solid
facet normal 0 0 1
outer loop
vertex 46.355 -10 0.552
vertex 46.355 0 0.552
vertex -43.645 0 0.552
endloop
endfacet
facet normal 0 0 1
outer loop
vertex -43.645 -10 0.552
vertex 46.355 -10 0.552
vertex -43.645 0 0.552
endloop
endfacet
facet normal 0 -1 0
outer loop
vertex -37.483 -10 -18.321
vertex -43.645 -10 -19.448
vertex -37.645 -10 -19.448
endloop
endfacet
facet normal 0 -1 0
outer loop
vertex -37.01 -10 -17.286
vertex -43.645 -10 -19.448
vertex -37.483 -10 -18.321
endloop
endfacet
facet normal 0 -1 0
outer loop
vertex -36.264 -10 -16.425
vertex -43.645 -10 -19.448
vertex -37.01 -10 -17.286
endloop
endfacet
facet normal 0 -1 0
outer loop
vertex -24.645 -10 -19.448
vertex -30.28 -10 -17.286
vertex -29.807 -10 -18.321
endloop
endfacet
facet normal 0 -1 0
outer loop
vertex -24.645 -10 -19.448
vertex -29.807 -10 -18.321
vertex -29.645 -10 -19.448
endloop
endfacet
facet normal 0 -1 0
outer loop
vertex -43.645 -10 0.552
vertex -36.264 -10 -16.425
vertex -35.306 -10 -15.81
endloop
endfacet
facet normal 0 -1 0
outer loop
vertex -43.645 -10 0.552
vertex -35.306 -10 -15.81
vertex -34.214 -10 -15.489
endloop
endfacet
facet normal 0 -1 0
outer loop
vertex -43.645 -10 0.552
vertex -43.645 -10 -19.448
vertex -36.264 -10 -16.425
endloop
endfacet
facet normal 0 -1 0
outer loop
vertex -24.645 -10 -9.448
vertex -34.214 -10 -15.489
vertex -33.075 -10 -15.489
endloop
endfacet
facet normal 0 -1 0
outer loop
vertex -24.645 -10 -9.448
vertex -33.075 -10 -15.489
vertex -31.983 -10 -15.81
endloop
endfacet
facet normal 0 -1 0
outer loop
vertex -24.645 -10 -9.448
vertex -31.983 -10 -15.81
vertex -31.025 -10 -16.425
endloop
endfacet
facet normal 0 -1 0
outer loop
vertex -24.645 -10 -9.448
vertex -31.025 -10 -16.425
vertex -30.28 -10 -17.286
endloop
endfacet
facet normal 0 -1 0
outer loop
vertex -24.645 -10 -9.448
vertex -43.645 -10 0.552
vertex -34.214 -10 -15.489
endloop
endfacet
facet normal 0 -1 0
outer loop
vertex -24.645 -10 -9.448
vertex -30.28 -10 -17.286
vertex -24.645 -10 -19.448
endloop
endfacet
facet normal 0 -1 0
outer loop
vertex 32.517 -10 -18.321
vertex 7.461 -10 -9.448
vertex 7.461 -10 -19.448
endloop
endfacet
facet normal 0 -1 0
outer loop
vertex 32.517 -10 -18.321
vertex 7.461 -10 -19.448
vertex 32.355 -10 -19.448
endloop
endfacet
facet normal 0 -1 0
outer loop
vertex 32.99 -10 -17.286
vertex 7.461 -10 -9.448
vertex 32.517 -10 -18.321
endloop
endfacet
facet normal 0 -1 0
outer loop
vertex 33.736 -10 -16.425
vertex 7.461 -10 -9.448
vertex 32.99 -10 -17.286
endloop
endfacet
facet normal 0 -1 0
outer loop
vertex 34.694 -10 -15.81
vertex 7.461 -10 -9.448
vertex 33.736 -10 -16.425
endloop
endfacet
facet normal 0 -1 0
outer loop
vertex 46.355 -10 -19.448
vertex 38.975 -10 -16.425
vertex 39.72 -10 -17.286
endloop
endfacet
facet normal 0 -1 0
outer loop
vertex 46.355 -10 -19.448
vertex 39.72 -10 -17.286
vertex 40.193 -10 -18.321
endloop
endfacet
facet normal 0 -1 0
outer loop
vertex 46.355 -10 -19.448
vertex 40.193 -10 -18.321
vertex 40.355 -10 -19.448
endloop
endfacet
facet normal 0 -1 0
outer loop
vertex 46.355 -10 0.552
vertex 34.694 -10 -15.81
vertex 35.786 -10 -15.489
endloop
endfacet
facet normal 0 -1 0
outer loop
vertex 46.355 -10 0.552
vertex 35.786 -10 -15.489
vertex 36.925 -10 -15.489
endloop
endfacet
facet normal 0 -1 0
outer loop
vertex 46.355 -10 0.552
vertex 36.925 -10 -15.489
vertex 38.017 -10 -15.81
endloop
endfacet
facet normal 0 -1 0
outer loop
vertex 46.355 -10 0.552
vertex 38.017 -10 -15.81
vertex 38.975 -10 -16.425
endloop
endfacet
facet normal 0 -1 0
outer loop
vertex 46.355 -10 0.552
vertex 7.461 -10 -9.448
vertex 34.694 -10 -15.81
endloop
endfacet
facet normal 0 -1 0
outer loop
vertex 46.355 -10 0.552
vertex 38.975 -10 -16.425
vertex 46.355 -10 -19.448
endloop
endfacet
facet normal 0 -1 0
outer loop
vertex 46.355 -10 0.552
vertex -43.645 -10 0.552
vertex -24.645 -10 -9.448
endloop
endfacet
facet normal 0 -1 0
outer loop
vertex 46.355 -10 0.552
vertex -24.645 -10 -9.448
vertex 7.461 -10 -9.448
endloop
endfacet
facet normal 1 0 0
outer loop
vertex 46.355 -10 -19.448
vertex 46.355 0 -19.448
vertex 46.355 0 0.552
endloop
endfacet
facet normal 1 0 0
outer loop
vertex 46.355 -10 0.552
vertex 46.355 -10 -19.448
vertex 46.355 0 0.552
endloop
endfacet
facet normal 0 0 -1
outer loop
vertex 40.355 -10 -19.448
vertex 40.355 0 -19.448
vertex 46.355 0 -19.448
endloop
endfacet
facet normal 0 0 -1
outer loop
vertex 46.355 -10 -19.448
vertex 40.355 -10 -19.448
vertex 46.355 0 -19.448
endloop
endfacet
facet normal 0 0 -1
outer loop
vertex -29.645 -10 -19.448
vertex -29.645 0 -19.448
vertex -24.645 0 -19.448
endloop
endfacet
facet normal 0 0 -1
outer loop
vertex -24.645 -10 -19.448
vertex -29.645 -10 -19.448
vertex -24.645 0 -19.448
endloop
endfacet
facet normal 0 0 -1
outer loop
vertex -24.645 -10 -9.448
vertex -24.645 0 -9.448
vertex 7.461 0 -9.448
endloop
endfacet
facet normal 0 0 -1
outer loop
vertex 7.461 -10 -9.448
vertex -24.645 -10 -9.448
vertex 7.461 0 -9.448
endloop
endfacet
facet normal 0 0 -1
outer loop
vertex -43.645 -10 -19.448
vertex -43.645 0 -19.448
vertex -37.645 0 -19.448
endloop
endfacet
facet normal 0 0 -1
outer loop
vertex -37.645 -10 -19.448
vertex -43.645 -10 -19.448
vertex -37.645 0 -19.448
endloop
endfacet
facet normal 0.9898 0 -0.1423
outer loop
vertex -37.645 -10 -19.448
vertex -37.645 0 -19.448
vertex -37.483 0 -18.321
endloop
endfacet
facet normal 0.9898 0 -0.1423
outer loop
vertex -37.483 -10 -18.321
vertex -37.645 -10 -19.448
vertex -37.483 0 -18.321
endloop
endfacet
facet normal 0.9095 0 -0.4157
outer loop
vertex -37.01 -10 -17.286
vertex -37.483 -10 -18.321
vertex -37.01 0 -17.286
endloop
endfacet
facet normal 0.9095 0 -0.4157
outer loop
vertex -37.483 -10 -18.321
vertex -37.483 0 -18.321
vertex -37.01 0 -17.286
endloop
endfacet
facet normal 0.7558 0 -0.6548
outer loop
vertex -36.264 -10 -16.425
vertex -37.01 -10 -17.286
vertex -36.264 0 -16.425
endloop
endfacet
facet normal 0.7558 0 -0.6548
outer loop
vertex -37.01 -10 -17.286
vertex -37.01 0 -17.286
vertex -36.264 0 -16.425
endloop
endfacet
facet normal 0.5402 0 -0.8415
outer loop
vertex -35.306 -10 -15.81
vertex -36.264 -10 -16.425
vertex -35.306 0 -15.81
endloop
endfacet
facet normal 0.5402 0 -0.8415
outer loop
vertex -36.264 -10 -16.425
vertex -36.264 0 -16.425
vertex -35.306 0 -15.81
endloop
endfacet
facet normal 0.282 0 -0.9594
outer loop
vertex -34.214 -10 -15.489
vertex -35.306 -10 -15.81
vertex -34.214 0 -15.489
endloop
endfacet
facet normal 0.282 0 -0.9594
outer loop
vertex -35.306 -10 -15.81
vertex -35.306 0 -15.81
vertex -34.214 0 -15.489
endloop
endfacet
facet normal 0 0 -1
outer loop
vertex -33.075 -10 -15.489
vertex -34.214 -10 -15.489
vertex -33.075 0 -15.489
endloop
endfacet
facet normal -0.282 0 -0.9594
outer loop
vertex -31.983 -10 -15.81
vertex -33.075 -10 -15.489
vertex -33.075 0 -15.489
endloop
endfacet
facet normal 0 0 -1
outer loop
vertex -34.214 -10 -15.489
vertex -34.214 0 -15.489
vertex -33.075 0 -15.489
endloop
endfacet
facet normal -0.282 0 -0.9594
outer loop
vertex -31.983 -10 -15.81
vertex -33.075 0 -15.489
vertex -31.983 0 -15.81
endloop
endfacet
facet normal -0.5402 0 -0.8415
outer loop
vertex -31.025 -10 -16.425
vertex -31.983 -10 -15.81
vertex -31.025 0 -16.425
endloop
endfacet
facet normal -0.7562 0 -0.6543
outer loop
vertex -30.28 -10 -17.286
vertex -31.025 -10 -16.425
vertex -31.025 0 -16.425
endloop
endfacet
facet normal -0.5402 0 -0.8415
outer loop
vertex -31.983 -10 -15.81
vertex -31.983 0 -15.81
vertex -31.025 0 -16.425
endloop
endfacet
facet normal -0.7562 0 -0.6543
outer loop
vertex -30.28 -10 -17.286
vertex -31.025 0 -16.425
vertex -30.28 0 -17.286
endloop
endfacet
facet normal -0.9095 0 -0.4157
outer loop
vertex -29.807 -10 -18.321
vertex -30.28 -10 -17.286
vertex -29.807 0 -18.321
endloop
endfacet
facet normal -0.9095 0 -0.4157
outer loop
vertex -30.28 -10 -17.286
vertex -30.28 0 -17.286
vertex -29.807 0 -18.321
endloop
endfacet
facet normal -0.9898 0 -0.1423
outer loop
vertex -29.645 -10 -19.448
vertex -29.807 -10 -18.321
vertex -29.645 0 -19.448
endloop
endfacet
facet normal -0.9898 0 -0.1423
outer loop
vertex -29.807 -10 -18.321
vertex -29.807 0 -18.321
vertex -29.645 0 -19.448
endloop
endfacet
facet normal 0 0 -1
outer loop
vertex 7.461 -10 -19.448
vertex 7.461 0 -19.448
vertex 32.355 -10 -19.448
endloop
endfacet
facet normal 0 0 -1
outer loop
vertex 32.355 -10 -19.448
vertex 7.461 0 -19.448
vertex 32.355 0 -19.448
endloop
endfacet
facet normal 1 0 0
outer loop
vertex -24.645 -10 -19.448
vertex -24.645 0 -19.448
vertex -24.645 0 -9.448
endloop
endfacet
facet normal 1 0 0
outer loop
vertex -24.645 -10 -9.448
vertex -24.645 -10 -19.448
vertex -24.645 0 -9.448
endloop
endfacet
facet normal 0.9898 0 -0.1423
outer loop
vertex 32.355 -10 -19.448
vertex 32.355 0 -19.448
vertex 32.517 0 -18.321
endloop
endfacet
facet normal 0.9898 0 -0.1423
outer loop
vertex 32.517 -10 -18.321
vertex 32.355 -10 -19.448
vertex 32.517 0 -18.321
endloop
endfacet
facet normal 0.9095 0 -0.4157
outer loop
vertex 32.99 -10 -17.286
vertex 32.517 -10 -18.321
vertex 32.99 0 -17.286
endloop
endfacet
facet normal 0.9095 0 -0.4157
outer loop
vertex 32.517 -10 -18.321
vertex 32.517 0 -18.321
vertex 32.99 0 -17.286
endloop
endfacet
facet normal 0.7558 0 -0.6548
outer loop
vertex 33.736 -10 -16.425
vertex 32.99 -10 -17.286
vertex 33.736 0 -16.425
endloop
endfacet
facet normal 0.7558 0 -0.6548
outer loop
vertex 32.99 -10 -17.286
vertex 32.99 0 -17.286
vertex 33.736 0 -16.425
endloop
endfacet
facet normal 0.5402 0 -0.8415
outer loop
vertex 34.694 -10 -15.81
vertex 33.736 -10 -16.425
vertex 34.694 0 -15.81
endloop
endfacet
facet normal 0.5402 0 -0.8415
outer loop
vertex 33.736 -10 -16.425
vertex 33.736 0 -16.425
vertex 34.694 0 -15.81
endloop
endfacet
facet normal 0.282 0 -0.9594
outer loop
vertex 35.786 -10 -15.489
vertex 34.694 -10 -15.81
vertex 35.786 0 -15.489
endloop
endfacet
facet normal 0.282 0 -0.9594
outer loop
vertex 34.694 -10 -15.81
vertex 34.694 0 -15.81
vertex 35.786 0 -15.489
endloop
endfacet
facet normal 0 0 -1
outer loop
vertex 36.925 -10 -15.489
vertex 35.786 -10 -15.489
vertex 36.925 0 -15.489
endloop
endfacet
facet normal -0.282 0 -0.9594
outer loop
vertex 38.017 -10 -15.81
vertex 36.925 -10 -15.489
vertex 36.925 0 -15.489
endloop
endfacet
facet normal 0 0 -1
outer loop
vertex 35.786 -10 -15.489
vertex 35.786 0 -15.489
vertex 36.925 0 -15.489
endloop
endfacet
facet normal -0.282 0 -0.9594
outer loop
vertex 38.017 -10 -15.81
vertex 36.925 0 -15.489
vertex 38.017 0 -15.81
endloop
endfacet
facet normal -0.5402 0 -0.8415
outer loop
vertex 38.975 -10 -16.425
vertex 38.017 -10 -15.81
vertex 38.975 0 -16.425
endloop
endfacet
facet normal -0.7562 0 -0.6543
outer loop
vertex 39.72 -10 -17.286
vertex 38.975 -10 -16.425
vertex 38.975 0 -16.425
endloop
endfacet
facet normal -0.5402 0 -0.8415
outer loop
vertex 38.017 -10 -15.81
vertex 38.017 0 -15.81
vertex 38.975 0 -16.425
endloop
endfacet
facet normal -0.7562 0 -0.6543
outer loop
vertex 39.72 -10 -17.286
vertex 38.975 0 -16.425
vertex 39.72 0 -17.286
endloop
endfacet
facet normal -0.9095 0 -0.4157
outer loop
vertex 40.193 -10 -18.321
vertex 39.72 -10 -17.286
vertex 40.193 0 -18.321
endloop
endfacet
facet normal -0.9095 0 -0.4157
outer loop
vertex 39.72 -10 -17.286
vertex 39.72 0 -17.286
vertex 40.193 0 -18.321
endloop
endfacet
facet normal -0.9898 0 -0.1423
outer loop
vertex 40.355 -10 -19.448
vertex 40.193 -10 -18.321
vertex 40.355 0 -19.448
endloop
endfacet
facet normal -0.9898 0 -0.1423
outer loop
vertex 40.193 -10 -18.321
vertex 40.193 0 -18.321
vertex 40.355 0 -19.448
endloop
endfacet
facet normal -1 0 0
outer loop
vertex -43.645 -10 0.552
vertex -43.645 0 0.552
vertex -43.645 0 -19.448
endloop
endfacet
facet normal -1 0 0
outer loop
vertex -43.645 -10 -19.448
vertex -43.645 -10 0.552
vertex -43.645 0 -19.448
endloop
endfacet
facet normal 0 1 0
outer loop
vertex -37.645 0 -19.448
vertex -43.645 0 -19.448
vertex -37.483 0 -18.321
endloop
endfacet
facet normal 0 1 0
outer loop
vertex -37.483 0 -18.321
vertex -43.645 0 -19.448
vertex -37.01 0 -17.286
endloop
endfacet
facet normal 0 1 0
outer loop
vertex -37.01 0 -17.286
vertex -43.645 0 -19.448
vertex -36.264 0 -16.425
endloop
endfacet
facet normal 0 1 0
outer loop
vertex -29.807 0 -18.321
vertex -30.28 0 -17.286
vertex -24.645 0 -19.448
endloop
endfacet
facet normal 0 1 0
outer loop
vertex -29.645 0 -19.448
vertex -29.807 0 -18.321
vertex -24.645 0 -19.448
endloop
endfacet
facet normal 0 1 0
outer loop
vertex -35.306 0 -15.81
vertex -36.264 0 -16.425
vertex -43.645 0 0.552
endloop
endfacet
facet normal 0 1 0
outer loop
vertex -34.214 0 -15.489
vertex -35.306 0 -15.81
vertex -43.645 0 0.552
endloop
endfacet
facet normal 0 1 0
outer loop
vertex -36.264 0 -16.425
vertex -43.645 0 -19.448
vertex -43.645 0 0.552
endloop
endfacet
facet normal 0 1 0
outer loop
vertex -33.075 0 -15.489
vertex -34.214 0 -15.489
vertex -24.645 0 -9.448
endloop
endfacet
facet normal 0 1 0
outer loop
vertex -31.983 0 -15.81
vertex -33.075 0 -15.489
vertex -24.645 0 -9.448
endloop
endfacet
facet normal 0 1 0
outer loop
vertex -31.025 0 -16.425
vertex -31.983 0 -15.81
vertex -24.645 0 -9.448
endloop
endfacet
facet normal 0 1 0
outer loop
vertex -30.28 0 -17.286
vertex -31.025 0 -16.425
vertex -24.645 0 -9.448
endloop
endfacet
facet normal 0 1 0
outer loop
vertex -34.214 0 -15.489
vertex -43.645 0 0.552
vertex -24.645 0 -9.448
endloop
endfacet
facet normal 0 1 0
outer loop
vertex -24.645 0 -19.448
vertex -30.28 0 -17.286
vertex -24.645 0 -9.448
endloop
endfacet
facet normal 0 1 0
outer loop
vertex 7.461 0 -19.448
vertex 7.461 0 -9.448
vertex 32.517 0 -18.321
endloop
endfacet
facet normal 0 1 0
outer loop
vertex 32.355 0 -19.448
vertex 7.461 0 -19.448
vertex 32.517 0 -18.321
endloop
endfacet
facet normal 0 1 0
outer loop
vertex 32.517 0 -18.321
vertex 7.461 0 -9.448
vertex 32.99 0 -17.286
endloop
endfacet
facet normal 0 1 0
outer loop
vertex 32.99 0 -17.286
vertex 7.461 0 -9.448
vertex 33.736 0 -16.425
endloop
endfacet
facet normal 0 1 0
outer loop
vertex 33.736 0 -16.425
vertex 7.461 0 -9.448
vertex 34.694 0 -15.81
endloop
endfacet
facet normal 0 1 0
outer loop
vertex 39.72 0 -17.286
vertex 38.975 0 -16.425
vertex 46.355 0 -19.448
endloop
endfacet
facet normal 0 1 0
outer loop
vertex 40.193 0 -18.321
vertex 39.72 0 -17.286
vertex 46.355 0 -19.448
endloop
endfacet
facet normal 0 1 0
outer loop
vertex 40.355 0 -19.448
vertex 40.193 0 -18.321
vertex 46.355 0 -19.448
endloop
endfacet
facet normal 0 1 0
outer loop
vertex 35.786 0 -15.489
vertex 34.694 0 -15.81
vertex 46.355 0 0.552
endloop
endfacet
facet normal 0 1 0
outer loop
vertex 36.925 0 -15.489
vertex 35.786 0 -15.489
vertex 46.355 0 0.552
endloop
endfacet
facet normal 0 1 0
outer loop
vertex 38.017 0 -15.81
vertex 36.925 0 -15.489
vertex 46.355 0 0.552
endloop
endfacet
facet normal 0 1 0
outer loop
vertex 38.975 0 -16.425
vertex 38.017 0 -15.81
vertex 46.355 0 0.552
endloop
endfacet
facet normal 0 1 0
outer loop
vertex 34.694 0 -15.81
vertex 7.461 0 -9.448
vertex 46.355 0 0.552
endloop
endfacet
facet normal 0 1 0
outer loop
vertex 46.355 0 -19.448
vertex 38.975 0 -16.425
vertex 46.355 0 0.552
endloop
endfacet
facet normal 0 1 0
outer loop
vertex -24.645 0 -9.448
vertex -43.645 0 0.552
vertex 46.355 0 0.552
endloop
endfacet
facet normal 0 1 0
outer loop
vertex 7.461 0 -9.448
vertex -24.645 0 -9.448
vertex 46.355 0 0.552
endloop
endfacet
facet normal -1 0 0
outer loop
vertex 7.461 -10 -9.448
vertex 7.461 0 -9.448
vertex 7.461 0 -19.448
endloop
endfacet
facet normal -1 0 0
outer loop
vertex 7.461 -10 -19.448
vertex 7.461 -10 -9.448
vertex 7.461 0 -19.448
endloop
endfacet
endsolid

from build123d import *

# Parameters (mm, degrees)
F1_DEPTH = 10


with BuildPart() as f1:
    # F0 (on Front) → F1 (new body)
    with BuildSketch(Plane.XZ):
        with BuildLine():
            ThreePointArc((-37.644739, -19.448335), (-33.644739, -15.448335), (-29.644739, -19.448335))
            Line((-29.644739, -19.448335), (-24.644739, -19.448335))
            Line((-24.644739, -19.448335), (-24.644739, -9.448335))
            Line((-24.644739, -9.448335), (7.460523, -9.448335))
            Line((7.460523, -9.448335), (7.460523, -19.448335))
            Line((7.460523, -19.448335), (32.355261, -19.448335))
            ThreePointArc((32.355261, -19.448335), (36.355261, -15.448335), (40.355261, -19.448335))
            Line((40.355261, -19.448335), (46.355261, -19.448335))
            Line((46.355261, -19.448335), (46.355261, 0.551665))
            Line((46.355261, 0.551665), (-43.644739, 0.551665))
            Line((-43.644739, 0.551665), (-43.644739, -19.448335))
            Line((-43.644739, -19.448335), (-37.644739, -19.448335))
        make_face()
    extrude(amount=F1_DEPTH)


solid = f1.part
